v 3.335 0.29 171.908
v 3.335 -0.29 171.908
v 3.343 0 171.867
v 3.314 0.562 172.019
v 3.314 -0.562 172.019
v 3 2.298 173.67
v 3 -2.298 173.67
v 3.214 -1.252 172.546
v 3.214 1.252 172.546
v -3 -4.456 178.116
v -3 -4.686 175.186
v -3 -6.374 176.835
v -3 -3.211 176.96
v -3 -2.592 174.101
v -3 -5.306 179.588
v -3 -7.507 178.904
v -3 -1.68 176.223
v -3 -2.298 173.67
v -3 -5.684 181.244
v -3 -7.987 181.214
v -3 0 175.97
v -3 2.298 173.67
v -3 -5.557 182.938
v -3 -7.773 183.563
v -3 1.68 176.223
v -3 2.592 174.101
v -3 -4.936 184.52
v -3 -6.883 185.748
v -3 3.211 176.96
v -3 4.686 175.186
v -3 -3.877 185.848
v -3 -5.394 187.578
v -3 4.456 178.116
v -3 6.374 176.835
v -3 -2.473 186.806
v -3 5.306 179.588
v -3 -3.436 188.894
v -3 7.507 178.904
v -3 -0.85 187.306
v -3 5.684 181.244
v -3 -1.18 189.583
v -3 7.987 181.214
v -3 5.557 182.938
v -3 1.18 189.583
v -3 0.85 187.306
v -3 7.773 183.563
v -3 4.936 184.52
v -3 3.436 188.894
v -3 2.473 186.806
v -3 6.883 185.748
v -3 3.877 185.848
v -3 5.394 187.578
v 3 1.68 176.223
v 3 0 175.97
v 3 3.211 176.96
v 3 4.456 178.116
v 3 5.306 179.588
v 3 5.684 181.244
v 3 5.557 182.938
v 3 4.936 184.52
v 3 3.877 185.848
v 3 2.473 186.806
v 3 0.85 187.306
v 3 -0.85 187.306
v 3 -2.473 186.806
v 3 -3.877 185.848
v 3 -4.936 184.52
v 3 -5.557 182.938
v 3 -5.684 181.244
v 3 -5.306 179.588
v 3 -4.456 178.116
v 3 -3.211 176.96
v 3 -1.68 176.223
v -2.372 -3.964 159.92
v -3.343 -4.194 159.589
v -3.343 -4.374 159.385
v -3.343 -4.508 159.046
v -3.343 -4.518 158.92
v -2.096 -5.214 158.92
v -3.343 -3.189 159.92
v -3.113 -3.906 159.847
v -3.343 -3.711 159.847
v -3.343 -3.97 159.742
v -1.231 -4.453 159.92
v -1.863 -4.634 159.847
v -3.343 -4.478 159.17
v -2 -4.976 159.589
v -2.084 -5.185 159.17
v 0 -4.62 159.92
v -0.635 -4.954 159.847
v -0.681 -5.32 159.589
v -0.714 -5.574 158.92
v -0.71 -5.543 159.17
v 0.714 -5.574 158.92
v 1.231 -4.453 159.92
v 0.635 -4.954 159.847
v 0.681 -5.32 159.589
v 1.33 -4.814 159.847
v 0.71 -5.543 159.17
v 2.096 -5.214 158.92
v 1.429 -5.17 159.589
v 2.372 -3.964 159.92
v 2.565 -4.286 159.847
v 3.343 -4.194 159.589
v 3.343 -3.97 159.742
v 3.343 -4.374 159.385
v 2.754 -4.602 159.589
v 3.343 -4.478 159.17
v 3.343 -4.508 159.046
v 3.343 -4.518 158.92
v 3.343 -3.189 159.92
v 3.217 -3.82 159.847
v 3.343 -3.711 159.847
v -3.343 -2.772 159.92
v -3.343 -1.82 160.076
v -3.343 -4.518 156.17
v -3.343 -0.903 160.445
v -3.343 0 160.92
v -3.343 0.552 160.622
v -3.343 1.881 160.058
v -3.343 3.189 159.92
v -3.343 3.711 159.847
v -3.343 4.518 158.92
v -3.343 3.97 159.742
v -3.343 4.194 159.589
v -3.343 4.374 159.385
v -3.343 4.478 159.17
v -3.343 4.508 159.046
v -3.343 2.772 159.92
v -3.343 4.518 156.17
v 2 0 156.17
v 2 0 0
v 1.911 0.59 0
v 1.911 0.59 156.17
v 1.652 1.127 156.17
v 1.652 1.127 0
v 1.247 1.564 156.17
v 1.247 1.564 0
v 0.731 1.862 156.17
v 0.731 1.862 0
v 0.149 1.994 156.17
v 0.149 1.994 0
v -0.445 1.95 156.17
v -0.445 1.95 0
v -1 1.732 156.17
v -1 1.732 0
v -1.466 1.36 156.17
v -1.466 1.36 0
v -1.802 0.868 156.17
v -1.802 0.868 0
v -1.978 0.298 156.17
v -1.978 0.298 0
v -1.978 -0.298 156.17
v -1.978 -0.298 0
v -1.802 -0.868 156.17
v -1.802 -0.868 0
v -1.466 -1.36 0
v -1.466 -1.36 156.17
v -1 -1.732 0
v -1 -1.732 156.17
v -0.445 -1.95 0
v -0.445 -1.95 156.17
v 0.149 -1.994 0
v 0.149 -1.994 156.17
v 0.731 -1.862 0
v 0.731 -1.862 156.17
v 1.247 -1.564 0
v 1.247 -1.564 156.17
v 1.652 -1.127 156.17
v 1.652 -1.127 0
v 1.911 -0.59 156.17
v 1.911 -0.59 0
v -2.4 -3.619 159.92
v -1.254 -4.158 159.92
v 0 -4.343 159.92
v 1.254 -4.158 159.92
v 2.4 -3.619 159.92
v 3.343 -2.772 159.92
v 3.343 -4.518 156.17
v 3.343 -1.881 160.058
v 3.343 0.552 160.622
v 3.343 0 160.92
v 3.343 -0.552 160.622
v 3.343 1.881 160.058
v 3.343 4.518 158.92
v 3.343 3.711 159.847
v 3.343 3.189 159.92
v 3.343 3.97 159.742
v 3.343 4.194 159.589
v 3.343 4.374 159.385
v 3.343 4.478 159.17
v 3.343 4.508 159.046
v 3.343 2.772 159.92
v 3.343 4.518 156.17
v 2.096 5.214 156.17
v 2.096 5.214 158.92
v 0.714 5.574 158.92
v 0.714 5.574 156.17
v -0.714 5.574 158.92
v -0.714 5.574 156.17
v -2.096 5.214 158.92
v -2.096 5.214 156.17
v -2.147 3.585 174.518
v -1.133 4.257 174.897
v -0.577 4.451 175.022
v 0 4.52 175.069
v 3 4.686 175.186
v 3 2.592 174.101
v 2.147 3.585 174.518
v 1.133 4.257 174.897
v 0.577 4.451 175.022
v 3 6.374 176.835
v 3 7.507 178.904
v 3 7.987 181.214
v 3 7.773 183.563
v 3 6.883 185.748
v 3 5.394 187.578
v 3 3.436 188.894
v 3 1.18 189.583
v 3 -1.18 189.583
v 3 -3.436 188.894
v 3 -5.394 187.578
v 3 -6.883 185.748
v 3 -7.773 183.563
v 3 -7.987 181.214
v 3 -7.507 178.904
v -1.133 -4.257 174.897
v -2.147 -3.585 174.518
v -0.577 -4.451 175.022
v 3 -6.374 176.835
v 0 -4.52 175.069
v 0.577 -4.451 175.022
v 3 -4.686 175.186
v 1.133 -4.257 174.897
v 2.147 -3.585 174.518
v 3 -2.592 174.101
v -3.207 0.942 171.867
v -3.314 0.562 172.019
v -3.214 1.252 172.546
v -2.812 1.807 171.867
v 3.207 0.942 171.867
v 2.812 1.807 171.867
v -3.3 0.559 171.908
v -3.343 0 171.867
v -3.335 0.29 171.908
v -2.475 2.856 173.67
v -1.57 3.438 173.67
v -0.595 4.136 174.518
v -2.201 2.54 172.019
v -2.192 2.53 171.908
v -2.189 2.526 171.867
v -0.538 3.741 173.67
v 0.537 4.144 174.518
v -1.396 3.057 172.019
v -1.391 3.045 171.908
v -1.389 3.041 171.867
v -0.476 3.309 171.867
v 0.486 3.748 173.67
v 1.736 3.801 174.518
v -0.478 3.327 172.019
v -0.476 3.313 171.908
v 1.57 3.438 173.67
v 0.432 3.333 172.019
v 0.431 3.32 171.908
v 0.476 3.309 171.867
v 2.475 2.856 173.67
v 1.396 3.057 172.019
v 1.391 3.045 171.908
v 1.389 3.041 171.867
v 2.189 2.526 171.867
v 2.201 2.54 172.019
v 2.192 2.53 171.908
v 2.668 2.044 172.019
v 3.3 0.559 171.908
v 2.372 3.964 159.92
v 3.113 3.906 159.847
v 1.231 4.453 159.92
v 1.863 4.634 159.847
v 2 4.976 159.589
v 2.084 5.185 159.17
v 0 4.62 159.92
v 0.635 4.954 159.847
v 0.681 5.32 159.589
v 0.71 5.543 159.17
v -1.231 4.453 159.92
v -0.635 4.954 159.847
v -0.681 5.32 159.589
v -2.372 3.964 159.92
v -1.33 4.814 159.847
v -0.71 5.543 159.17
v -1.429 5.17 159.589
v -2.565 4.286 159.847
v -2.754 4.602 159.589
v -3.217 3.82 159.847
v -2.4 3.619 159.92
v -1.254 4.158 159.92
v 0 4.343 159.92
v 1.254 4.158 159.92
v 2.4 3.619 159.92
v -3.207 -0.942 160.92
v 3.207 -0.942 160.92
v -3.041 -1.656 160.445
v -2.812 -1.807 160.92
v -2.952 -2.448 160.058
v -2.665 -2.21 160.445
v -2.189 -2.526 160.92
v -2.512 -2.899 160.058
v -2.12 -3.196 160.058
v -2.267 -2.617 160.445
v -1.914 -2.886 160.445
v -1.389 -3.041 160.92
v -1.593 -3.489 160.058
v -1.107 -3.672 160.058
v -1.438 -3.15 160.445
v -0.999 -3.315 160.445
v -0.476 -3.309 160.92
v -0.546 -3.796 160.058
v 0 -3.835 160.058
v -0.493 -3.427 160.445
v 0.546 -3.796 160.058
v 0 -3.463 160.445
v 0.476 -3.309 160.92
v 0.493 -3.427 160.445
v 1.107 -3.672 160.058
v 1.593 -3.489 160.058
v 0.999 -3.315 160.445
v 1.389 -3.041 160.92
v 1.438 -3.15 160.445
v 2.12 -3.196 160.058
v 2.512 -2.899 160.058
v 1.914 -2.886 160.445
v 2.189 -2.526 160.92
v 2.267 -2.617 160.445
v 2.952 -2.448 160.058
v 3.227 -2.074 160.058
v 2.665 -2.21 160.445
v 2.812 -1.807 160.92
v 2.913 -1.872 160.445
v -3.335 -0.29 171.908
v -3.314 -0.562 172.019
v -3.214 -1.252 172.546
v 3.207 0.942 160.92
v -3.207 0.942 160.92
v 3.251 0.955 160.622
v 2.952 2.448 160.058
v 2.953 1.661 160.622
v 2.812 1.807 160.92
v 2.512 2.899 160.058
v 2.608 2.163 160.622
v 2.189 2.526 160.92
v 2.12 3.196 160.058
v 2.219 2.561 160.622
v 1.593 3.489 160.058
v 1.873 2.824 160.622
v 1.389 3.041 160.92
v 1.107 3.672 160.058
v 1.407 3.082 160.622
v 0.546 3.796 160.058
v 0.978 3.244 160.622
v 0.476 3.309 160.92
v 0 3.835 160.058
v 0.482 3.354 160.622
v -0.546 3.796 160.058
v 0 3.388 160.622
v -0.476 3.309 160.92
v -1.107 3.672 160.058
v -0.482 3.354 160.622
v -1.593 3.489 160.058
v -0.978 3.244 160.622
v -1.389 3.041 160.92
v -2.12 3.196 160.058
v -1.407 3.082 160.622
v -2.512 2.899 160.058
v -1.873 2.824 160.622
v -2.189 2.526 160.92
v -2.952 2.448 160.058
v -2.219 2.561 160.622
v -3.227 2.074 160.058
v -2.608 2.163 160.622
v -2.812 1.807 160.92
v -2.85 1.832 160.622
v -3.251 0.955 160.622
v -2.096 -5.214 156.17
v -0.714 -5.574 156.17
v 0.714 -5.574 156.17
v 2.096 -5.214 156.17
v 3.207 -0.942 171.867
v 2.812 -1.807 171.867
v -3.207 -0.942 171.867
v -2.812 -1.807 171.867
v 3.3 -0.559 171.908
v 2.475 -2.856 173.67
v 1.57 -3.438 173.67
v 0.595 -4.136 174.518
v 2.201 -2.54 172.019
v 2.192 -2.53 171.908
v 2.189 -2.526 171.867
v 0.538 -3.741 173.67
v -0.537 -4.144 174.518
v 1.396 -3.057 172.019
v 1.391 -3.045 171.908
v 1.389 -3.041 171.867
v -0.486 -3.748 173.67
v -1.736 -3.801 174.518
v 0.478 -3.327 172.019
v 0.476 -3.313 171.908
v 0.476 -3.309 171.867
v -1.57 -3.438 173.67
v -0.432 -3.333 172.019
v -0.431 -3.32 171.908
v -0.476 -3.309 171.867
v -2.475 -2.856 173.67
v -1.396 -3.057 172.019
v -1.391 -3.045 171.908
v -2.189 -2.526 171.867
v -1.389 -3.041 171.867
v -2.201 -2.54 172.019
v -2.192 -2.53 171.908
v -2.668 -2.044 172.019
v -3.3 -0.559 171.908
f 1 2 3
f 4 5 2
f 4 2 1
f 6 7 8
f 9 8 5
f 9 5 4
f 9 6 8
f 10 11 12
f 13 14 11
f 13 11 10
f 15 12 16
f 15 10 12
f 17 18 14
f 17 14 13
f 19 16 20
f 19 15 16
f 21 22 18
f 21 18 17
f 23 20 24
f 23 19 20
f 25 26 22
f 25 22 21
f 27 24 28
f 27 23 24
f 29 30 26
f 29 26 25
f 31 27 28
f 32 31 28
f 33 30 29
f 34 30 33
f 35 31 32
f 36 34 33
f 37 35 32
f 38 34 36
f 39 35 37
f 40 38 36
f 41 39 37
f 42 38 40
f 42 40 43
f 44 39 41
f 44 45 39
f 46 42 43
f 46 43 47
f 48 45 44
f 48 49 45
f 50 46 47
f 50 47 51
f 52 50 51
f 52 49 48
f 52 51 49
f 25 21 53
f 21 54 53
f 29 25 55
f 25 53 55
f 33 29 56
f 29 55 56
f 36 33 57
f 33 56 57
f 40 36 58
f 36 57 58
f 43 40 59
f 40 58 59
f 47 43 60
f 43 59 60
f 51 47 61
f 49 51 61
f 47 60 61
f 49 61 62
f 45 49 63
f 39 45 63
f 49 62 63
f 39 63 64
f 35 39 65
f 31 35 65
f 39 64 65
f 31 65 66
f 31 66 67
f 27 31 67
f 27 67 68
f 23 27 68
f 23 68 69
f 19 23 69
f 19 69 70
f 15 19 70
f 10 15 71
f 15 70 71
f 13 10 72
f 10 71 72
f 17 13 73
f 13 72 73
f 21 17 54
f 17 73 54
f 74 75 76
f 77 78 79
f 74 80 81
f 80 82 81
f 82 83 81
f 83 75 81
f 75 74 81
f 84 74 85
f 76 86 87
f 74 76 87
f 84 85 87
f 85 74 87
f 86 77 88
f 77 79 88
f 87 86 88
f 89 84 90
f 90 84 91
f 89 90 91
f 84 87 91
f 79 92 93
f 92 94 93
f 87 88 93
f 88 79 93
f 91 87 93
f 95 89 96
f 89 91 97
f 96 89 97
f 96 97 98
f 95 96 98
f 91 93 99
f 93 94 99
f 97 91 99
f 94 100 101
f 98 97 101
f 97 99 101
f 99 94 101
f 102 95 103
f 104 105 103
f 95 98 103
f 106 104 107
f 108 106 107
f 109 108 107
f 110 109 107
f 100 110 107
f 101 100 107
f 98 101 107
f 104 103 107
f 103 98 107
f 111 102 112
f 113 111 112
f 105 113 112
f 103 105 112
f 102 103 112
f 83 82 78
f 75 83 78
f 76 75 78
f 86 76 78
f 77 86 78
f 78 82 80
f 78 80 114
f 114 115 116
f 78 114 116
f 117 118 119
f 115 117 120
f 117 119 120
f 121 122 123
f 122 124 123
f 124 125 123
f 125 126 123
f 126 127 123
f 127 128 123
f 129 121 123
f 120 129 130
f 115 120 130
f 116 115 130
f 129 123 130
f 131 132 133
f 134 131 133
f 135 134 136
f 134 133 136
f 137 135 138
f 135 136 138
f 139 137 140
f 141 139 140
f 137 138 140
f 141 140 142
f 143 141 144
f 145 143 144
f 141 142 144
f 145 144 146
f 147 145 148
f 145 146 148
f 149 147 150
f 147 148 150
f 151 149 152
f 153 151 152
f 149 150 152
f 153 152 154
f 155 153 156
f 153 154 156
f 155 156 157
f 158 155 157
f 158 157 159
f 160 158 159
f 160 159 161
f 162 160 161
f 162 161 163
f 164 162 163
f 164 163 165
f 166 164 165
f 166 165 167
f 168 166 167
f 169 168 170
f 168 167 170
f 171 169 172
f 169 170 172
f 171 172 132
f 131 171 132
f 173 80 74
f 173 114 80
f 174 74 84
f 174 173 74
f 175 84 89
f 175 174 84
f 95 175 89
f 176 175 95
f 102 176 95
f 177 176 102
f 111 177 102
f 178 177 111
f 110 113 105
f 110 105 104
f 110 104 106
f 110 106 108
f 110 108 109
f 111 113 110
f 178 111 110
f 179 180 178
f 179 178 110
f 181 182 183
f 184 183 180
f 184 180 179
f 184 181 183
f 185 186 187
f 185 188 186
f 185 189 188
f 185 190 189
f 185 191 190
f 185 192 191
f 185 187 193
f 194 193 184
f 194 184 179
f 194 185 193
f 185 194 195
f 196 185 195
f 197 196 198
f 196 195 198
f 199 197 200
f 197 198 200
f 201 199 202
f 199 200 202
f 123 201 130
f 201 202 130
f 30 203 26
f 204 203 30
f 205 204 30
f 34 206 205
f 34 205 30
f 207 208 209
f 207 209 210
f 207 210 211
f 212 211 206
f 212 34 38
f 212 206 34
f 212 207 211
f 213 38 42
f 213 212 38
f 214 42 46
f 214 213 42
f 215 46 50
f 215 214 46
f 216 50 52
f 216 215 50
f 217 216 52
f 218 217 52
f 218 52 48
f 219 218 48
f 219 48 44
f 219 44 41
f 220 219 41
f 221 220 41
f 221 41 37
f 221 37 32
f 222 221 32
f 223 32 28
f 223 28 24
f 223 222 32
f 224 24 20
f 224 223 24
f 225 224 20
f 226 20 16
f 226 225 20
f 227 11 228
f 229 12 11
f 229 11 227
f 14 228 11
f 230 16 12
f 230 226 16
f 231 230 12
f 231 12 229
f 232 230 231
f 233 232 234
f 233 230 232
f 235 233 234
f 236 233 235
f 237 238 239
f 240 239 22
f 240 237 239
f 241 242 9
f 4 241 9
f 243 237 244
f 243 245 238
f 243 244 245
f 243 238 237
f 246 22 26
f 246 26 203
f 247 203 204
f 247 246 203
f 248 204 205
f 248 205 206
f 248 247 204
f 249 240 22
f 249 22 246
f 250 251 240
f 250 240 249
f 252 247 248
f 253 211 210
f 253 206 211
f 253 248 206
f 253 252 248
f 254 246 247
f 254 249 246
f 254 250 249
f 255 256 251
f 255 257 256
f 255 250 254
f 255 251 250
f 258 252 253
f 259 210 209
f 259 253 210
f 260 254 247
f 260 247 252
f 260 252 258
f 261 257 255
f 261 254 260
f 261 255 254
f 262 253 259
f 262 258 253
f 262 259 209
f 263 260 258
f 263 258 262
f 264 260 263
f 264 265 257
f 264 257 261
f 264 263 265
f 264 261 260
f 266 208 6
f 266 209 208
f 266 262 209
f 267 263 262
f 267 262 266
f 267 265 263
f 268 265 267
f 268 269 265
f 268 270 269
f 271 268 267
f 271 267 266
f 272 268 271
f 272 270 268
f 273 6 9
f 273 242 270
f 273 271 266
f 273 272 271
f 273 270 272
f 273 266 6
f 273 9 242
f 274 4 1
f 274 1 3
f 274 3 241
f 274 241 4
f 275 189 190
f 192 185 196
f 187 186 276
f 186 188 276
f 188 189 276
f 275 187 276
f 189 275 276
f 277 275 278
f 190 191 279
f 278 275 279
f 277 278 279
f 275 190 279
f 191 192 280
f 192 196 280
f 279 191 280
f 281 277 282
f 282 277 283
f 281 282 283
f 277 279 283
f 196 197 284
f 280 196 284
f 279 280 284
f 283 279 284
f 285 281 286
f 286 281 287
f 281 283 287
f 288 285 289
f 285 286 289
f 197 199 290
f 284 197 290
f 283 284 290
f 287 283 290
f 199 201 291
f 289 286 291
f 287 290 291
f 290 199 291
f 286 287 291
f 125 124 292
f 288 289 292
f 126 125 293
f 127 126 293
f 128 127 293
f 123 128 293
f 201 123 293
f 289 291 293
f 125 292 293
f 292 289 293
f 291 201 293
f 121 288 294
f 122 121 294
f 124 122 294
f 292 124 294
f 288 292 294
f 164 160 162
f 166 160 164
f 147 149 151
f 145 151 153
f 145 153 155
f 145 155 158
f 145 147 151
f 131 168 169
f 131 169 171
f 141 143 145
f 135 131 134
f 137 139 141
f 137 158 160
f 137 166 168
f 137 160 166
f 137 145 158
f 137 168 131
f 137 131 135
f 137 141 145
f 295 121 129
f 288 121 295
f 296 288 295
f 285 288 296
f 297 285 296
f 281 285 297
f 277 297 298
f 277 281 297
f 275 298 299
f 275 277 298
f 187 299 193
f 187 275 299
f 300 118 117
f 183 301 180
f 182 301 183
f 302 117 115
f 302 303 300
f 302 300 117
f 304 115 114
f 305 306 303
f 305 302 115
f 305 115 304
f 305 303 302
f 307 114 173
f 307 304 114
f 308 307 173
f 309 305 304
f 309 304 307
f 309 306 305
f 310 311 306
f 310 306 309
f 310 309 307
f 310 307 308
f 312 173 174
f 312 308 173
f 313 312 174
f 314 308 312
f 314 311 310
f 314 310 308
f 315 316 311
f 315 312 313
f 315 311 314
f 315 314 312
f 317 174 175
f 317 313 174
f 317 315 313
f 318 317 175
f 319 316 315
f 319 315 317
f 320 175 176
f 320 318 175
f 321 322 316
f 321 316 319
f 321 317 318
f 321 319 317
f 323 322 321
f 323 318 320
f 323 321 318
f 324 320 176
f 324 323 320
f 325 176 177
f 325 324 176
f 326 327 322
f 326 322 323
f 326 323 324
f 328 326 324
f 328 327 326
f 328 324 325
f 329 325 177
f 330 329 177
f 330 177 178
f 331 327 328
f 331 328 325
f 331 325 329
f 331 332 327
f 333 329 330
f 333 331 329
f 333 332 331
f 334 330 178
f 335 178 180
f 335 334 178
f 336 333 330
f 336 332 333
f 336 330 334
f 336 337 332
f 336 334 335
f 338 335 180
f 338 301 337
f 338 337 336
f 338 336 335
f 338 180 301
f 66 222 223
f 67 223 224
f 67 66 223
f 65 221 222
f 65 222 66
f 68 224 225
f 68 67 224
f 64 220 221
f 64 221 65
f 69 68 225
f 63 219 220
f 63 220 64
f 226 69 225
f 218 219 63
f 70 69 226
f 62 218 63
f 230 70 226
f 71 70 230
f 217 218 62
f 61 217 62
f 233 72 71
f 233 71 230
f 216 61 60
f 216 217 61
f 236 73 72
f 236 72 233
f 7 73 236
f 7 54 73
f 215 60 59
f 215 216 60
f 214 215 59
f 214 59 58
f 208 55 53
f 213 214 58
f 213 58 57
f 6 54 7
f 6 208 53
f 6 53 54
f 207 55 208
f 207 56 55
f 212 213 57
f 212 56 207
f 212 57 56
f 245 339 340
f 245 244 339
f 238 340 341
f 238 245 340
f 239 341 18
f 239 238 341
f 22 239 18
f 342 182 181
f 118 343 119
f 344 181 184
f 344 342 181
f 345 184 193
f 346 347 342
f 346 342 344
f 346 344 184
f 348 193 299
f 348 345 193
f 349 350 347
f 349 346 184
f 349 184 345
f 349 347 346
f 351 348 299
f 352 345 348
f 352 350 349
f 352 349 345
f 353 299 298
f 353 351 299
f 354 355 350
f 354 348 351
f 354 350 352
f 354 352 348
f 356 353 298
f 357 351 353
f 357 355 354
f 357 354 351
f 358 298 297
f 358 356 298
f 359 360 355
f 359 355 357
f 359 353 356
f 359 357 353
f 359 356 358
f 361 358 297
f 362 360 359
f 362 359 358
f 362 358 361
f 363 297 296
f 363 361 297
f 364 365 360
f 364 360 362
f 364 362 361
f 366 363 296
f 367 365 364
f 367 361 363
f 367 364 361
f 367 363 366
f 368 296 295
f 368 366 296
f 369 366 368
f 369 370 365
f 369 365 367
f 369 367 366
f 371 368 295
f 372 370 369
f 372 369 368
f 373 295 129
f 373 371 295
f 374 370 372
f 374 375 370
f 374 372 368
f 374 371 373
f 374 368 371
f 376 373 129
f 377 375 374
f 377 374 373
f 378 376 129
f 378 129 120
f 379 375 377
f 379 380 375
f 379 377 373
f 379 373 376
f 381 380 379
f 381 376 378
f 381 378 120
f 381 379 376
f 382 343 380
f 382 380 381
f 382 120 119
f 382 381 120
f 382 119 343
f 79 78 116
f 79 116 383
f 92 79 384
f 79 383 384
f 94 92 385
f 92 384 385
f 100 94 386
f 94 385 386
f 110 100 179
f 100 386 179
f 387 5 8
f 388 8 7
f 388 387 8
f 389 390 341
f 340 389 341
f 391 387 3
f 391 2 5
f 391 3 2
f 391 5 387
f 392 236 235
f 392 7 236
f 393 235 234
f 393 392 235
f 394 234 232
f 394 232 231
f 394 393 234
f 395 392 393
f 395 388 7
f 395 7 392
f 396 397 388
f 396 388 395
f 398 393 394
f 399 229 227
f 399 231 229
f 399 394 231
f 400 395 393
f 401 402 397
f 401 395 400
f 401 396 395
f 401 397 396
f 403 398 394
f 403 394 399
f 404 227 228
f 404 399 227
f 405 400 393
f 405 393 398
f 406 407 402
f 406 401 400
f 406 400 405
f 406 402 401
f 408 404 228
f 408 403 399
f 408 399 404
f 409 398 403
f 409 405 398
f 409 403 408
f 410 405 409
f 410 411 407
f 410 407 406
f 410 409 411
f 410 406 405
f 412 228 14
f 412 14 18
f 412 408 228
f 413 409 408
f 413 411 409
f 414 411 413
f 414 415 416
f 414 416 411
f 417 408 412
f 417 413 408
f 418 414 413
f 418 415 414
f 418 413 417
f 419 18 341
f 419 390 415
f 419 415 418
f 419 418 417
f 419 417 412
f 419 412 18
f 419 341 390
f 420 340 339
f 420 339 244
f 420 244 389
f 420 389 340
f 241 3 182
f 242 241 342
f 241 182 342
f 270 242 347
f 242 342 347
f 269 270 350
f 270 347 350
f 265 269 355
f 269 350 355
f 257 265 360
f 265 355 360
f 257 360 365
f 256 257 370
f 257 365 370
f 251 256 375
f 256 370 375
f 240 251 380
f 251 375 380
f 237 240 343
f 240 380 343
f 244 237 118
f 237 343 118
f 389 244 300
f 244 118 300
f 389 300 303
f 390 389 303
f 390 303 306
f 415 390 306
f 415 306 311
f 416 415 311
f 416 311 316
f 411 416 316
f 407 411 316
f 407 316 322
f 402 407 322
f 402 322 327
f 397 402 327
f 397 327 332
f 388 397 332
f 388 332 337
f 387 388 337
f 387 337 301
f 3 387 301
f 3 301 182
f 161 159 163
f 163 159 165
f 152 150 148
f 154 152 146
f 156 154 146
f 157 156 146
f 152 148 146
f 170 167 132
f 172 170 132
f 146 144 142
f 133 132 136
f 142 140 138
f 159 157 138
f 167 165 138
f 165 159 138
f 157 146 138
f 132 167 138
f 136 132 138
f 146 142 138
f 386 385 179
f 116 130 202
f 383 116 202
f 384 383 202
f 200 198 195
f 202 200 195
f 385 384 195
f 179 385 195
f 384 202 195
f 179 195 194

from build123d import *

# Parameters (mm, degrees)
SKETCH1_R                = 2
BOSS_EXTRUDE1_DEPTH      = 156.17
SKETCH2_R                = 5.62
BOSS_EXTRUDE2_DEPTH      = 3.75
SKETCH3_R                = 3.342777959
BOSS_EXTRUDE3_DEPTH      = 14.75
FILLET4_R                = 1
FILLET5_R                = 1
BOSS_EXTRUDE4_DEPTH      = 5
BOSS_EXTRUDE4_DEPTH_BACK = 5
SKETCH4_R                = 5.7
CUT_EXTRUDE2_DEPTH       = 190.921808488
CUT_EXTRUDE2_DEPTH_BACK  = 190.921808488
SKETCH7_W                = 5.315591211
SKETCH7_H                = 6.235782502


with BuildPart() as part:
    # Sketch1 → Boss-Extrude1 (new body)
    with BuildSketch(Plane.XY):
        Circle(SKETCH1_R)
    extrude(amount=BOSS_EXTRUDE1_DEPTH)


with BuildPart() as body_2:
    # Sketch2 → Boss-Extrude2 (new body)
    with BuildSketch(Plane.XY.offset(156.17)):
        Circle(SKETCH2_R)
    extrude(amount=BOSS_EXTRUDE2_DEPTH)

    # Sketch3 → Boss-Extrude3 (add)
    with BuildSketch(Plane.XY.offset(159.92)):
        Circle(SKETCH3_R)
    extrude(amount=BOSS_EXTRUDE3_DEPTH)

    # Fillet4
    fillet4_edges = [body_2.edges().sort_by_distance(p)[0] for p in [
        (-3.342777959, 0, 159.92),
    ]]
    fillet(fillet4_edges, radius=FILLET4_R)

    # Fillet5
    fillet5_edges = [body_2.edges().sort_by_distance(p)[0] for p in [
        (-5.62, 0, 159.92),
    ]]
    fillet(fillet5_edges, radius=FILLET5_R)

    # Sketch4 → Boss-Extrude4 (add, two sides: drawn at the far end of the back side and taken through both)
    with BuildSketch(Plane(origin=(0, 0, 0), x_dir=(0, 0, -1), z_dir=(1, 0, 0)).offset(-BOSS_EXTRUDE4_DEPTH_BACK)):
        with BuildLine():
            ThreePointArc((-173.67, 0), (-174.027795759, 2.365737588), (-175.069178584, 4.519862457))
            ThreePointArc((-175.069178584, 4.519862457), (-189.67, 0), (-175.069178584, -4.519862457))
            ThreePointArc((-175.069178584, -4.519862457), (-174.027795759, -2.365737588), (-173.67, 0))
        make_face()
        with Locations((-181.67, 0)):
            Circle(SKETCH4_R, mode=Mode.SUBTRACT)
    extrude(amount=BOSS_EXTRUDE4_DEPTH + BOSS_EXTRUDE4_DEPTH_BACK)


with BuildPart() as body_3:
    # Sketch4<4> → Revolve2 (revolve)
    with BuildSketch(Plane(origin=(0, 0, 0), x_dir=(0, 0, -1), z_dir=(1, 0, 0))):
        with BuildLine():
            Line((-171.86665682, 0), (-173.67, 0))
            ThreePointArc((-173.67, 0), (-174.027795759, -2.365737588), (-175.069178584, -4.519862457))
            add(Edge.make_bspline(
                [(-175.069178584, -4.519862457), (-173.629685325, -3.535053024), (-171.86665682, -3.342777959)],
                knots=[0, 0, 0, 1, 1, 1], degree=2))
            Line((-171.86665682, -3.342777959), (-171.86665682, 0))
        make_face()
    revolve(axis=Axis((0, 0, 189.67), (0, 0, -1)))


with BuildPart() as cut_extrude2_tool:
    # Sketch7 → Cut-Extrude2 (new, two sides: drawn at the far end of the back side and taken through both)
    with BuildSketch(Plane(origin=(0, 0, 0), x_dir=(1, 0, 0), z_dir=(0, 1, 0)).offset(-CUT_EXTRUDE2_DEPTH_BACK)):
        Polygon((3, -173.67), (3.34277796, -171.86665682), (8.65836917, -171.86665682), (8.65836917, -190.916502477), (3, -190.916502477), align=None)
        Polygon((-3, -190.916502477), (-8.65836917, -190.916502477), (-8.65836917, -171.86665682), (-3.34277796, -171.86665682), (-3, -173.67), align=None)
        with Locations((-6.000573564, -157.802108749)):
            Rectangle(SKETCH7_W, SKETCH7_H)
        with Locations((6.000573564, -157.802108749)):
            Rectangle(SKETCH7_W, SKETCH7_H)
    extrude(amount=CUT_EXTRUDE2_DEPTH + CUT_EXTRUDE2_DEPTH_BACK)


with BuildPart() as body_2_1:
    add(body_2.part)

    # Cut-Extrude2: cut by cut_extrude2_tool
    add(cut_extrude2_tool.part, mode=Mode.SUBTRACT)


with BuildPart() as body_3_1:
    add(body_3.part)

    # Cut-Extrude2: cut by cut_extrude2_tool
    add(cut_extrude2_tool.part, mode=Mode.SUBTRACT)


with BuildPart() as body_2_2:
    add(body_2_1.part)

    # Combine1: union body 3
    add(body_3_1.part)


solid = Compound([part.part, body_2_2.part])
